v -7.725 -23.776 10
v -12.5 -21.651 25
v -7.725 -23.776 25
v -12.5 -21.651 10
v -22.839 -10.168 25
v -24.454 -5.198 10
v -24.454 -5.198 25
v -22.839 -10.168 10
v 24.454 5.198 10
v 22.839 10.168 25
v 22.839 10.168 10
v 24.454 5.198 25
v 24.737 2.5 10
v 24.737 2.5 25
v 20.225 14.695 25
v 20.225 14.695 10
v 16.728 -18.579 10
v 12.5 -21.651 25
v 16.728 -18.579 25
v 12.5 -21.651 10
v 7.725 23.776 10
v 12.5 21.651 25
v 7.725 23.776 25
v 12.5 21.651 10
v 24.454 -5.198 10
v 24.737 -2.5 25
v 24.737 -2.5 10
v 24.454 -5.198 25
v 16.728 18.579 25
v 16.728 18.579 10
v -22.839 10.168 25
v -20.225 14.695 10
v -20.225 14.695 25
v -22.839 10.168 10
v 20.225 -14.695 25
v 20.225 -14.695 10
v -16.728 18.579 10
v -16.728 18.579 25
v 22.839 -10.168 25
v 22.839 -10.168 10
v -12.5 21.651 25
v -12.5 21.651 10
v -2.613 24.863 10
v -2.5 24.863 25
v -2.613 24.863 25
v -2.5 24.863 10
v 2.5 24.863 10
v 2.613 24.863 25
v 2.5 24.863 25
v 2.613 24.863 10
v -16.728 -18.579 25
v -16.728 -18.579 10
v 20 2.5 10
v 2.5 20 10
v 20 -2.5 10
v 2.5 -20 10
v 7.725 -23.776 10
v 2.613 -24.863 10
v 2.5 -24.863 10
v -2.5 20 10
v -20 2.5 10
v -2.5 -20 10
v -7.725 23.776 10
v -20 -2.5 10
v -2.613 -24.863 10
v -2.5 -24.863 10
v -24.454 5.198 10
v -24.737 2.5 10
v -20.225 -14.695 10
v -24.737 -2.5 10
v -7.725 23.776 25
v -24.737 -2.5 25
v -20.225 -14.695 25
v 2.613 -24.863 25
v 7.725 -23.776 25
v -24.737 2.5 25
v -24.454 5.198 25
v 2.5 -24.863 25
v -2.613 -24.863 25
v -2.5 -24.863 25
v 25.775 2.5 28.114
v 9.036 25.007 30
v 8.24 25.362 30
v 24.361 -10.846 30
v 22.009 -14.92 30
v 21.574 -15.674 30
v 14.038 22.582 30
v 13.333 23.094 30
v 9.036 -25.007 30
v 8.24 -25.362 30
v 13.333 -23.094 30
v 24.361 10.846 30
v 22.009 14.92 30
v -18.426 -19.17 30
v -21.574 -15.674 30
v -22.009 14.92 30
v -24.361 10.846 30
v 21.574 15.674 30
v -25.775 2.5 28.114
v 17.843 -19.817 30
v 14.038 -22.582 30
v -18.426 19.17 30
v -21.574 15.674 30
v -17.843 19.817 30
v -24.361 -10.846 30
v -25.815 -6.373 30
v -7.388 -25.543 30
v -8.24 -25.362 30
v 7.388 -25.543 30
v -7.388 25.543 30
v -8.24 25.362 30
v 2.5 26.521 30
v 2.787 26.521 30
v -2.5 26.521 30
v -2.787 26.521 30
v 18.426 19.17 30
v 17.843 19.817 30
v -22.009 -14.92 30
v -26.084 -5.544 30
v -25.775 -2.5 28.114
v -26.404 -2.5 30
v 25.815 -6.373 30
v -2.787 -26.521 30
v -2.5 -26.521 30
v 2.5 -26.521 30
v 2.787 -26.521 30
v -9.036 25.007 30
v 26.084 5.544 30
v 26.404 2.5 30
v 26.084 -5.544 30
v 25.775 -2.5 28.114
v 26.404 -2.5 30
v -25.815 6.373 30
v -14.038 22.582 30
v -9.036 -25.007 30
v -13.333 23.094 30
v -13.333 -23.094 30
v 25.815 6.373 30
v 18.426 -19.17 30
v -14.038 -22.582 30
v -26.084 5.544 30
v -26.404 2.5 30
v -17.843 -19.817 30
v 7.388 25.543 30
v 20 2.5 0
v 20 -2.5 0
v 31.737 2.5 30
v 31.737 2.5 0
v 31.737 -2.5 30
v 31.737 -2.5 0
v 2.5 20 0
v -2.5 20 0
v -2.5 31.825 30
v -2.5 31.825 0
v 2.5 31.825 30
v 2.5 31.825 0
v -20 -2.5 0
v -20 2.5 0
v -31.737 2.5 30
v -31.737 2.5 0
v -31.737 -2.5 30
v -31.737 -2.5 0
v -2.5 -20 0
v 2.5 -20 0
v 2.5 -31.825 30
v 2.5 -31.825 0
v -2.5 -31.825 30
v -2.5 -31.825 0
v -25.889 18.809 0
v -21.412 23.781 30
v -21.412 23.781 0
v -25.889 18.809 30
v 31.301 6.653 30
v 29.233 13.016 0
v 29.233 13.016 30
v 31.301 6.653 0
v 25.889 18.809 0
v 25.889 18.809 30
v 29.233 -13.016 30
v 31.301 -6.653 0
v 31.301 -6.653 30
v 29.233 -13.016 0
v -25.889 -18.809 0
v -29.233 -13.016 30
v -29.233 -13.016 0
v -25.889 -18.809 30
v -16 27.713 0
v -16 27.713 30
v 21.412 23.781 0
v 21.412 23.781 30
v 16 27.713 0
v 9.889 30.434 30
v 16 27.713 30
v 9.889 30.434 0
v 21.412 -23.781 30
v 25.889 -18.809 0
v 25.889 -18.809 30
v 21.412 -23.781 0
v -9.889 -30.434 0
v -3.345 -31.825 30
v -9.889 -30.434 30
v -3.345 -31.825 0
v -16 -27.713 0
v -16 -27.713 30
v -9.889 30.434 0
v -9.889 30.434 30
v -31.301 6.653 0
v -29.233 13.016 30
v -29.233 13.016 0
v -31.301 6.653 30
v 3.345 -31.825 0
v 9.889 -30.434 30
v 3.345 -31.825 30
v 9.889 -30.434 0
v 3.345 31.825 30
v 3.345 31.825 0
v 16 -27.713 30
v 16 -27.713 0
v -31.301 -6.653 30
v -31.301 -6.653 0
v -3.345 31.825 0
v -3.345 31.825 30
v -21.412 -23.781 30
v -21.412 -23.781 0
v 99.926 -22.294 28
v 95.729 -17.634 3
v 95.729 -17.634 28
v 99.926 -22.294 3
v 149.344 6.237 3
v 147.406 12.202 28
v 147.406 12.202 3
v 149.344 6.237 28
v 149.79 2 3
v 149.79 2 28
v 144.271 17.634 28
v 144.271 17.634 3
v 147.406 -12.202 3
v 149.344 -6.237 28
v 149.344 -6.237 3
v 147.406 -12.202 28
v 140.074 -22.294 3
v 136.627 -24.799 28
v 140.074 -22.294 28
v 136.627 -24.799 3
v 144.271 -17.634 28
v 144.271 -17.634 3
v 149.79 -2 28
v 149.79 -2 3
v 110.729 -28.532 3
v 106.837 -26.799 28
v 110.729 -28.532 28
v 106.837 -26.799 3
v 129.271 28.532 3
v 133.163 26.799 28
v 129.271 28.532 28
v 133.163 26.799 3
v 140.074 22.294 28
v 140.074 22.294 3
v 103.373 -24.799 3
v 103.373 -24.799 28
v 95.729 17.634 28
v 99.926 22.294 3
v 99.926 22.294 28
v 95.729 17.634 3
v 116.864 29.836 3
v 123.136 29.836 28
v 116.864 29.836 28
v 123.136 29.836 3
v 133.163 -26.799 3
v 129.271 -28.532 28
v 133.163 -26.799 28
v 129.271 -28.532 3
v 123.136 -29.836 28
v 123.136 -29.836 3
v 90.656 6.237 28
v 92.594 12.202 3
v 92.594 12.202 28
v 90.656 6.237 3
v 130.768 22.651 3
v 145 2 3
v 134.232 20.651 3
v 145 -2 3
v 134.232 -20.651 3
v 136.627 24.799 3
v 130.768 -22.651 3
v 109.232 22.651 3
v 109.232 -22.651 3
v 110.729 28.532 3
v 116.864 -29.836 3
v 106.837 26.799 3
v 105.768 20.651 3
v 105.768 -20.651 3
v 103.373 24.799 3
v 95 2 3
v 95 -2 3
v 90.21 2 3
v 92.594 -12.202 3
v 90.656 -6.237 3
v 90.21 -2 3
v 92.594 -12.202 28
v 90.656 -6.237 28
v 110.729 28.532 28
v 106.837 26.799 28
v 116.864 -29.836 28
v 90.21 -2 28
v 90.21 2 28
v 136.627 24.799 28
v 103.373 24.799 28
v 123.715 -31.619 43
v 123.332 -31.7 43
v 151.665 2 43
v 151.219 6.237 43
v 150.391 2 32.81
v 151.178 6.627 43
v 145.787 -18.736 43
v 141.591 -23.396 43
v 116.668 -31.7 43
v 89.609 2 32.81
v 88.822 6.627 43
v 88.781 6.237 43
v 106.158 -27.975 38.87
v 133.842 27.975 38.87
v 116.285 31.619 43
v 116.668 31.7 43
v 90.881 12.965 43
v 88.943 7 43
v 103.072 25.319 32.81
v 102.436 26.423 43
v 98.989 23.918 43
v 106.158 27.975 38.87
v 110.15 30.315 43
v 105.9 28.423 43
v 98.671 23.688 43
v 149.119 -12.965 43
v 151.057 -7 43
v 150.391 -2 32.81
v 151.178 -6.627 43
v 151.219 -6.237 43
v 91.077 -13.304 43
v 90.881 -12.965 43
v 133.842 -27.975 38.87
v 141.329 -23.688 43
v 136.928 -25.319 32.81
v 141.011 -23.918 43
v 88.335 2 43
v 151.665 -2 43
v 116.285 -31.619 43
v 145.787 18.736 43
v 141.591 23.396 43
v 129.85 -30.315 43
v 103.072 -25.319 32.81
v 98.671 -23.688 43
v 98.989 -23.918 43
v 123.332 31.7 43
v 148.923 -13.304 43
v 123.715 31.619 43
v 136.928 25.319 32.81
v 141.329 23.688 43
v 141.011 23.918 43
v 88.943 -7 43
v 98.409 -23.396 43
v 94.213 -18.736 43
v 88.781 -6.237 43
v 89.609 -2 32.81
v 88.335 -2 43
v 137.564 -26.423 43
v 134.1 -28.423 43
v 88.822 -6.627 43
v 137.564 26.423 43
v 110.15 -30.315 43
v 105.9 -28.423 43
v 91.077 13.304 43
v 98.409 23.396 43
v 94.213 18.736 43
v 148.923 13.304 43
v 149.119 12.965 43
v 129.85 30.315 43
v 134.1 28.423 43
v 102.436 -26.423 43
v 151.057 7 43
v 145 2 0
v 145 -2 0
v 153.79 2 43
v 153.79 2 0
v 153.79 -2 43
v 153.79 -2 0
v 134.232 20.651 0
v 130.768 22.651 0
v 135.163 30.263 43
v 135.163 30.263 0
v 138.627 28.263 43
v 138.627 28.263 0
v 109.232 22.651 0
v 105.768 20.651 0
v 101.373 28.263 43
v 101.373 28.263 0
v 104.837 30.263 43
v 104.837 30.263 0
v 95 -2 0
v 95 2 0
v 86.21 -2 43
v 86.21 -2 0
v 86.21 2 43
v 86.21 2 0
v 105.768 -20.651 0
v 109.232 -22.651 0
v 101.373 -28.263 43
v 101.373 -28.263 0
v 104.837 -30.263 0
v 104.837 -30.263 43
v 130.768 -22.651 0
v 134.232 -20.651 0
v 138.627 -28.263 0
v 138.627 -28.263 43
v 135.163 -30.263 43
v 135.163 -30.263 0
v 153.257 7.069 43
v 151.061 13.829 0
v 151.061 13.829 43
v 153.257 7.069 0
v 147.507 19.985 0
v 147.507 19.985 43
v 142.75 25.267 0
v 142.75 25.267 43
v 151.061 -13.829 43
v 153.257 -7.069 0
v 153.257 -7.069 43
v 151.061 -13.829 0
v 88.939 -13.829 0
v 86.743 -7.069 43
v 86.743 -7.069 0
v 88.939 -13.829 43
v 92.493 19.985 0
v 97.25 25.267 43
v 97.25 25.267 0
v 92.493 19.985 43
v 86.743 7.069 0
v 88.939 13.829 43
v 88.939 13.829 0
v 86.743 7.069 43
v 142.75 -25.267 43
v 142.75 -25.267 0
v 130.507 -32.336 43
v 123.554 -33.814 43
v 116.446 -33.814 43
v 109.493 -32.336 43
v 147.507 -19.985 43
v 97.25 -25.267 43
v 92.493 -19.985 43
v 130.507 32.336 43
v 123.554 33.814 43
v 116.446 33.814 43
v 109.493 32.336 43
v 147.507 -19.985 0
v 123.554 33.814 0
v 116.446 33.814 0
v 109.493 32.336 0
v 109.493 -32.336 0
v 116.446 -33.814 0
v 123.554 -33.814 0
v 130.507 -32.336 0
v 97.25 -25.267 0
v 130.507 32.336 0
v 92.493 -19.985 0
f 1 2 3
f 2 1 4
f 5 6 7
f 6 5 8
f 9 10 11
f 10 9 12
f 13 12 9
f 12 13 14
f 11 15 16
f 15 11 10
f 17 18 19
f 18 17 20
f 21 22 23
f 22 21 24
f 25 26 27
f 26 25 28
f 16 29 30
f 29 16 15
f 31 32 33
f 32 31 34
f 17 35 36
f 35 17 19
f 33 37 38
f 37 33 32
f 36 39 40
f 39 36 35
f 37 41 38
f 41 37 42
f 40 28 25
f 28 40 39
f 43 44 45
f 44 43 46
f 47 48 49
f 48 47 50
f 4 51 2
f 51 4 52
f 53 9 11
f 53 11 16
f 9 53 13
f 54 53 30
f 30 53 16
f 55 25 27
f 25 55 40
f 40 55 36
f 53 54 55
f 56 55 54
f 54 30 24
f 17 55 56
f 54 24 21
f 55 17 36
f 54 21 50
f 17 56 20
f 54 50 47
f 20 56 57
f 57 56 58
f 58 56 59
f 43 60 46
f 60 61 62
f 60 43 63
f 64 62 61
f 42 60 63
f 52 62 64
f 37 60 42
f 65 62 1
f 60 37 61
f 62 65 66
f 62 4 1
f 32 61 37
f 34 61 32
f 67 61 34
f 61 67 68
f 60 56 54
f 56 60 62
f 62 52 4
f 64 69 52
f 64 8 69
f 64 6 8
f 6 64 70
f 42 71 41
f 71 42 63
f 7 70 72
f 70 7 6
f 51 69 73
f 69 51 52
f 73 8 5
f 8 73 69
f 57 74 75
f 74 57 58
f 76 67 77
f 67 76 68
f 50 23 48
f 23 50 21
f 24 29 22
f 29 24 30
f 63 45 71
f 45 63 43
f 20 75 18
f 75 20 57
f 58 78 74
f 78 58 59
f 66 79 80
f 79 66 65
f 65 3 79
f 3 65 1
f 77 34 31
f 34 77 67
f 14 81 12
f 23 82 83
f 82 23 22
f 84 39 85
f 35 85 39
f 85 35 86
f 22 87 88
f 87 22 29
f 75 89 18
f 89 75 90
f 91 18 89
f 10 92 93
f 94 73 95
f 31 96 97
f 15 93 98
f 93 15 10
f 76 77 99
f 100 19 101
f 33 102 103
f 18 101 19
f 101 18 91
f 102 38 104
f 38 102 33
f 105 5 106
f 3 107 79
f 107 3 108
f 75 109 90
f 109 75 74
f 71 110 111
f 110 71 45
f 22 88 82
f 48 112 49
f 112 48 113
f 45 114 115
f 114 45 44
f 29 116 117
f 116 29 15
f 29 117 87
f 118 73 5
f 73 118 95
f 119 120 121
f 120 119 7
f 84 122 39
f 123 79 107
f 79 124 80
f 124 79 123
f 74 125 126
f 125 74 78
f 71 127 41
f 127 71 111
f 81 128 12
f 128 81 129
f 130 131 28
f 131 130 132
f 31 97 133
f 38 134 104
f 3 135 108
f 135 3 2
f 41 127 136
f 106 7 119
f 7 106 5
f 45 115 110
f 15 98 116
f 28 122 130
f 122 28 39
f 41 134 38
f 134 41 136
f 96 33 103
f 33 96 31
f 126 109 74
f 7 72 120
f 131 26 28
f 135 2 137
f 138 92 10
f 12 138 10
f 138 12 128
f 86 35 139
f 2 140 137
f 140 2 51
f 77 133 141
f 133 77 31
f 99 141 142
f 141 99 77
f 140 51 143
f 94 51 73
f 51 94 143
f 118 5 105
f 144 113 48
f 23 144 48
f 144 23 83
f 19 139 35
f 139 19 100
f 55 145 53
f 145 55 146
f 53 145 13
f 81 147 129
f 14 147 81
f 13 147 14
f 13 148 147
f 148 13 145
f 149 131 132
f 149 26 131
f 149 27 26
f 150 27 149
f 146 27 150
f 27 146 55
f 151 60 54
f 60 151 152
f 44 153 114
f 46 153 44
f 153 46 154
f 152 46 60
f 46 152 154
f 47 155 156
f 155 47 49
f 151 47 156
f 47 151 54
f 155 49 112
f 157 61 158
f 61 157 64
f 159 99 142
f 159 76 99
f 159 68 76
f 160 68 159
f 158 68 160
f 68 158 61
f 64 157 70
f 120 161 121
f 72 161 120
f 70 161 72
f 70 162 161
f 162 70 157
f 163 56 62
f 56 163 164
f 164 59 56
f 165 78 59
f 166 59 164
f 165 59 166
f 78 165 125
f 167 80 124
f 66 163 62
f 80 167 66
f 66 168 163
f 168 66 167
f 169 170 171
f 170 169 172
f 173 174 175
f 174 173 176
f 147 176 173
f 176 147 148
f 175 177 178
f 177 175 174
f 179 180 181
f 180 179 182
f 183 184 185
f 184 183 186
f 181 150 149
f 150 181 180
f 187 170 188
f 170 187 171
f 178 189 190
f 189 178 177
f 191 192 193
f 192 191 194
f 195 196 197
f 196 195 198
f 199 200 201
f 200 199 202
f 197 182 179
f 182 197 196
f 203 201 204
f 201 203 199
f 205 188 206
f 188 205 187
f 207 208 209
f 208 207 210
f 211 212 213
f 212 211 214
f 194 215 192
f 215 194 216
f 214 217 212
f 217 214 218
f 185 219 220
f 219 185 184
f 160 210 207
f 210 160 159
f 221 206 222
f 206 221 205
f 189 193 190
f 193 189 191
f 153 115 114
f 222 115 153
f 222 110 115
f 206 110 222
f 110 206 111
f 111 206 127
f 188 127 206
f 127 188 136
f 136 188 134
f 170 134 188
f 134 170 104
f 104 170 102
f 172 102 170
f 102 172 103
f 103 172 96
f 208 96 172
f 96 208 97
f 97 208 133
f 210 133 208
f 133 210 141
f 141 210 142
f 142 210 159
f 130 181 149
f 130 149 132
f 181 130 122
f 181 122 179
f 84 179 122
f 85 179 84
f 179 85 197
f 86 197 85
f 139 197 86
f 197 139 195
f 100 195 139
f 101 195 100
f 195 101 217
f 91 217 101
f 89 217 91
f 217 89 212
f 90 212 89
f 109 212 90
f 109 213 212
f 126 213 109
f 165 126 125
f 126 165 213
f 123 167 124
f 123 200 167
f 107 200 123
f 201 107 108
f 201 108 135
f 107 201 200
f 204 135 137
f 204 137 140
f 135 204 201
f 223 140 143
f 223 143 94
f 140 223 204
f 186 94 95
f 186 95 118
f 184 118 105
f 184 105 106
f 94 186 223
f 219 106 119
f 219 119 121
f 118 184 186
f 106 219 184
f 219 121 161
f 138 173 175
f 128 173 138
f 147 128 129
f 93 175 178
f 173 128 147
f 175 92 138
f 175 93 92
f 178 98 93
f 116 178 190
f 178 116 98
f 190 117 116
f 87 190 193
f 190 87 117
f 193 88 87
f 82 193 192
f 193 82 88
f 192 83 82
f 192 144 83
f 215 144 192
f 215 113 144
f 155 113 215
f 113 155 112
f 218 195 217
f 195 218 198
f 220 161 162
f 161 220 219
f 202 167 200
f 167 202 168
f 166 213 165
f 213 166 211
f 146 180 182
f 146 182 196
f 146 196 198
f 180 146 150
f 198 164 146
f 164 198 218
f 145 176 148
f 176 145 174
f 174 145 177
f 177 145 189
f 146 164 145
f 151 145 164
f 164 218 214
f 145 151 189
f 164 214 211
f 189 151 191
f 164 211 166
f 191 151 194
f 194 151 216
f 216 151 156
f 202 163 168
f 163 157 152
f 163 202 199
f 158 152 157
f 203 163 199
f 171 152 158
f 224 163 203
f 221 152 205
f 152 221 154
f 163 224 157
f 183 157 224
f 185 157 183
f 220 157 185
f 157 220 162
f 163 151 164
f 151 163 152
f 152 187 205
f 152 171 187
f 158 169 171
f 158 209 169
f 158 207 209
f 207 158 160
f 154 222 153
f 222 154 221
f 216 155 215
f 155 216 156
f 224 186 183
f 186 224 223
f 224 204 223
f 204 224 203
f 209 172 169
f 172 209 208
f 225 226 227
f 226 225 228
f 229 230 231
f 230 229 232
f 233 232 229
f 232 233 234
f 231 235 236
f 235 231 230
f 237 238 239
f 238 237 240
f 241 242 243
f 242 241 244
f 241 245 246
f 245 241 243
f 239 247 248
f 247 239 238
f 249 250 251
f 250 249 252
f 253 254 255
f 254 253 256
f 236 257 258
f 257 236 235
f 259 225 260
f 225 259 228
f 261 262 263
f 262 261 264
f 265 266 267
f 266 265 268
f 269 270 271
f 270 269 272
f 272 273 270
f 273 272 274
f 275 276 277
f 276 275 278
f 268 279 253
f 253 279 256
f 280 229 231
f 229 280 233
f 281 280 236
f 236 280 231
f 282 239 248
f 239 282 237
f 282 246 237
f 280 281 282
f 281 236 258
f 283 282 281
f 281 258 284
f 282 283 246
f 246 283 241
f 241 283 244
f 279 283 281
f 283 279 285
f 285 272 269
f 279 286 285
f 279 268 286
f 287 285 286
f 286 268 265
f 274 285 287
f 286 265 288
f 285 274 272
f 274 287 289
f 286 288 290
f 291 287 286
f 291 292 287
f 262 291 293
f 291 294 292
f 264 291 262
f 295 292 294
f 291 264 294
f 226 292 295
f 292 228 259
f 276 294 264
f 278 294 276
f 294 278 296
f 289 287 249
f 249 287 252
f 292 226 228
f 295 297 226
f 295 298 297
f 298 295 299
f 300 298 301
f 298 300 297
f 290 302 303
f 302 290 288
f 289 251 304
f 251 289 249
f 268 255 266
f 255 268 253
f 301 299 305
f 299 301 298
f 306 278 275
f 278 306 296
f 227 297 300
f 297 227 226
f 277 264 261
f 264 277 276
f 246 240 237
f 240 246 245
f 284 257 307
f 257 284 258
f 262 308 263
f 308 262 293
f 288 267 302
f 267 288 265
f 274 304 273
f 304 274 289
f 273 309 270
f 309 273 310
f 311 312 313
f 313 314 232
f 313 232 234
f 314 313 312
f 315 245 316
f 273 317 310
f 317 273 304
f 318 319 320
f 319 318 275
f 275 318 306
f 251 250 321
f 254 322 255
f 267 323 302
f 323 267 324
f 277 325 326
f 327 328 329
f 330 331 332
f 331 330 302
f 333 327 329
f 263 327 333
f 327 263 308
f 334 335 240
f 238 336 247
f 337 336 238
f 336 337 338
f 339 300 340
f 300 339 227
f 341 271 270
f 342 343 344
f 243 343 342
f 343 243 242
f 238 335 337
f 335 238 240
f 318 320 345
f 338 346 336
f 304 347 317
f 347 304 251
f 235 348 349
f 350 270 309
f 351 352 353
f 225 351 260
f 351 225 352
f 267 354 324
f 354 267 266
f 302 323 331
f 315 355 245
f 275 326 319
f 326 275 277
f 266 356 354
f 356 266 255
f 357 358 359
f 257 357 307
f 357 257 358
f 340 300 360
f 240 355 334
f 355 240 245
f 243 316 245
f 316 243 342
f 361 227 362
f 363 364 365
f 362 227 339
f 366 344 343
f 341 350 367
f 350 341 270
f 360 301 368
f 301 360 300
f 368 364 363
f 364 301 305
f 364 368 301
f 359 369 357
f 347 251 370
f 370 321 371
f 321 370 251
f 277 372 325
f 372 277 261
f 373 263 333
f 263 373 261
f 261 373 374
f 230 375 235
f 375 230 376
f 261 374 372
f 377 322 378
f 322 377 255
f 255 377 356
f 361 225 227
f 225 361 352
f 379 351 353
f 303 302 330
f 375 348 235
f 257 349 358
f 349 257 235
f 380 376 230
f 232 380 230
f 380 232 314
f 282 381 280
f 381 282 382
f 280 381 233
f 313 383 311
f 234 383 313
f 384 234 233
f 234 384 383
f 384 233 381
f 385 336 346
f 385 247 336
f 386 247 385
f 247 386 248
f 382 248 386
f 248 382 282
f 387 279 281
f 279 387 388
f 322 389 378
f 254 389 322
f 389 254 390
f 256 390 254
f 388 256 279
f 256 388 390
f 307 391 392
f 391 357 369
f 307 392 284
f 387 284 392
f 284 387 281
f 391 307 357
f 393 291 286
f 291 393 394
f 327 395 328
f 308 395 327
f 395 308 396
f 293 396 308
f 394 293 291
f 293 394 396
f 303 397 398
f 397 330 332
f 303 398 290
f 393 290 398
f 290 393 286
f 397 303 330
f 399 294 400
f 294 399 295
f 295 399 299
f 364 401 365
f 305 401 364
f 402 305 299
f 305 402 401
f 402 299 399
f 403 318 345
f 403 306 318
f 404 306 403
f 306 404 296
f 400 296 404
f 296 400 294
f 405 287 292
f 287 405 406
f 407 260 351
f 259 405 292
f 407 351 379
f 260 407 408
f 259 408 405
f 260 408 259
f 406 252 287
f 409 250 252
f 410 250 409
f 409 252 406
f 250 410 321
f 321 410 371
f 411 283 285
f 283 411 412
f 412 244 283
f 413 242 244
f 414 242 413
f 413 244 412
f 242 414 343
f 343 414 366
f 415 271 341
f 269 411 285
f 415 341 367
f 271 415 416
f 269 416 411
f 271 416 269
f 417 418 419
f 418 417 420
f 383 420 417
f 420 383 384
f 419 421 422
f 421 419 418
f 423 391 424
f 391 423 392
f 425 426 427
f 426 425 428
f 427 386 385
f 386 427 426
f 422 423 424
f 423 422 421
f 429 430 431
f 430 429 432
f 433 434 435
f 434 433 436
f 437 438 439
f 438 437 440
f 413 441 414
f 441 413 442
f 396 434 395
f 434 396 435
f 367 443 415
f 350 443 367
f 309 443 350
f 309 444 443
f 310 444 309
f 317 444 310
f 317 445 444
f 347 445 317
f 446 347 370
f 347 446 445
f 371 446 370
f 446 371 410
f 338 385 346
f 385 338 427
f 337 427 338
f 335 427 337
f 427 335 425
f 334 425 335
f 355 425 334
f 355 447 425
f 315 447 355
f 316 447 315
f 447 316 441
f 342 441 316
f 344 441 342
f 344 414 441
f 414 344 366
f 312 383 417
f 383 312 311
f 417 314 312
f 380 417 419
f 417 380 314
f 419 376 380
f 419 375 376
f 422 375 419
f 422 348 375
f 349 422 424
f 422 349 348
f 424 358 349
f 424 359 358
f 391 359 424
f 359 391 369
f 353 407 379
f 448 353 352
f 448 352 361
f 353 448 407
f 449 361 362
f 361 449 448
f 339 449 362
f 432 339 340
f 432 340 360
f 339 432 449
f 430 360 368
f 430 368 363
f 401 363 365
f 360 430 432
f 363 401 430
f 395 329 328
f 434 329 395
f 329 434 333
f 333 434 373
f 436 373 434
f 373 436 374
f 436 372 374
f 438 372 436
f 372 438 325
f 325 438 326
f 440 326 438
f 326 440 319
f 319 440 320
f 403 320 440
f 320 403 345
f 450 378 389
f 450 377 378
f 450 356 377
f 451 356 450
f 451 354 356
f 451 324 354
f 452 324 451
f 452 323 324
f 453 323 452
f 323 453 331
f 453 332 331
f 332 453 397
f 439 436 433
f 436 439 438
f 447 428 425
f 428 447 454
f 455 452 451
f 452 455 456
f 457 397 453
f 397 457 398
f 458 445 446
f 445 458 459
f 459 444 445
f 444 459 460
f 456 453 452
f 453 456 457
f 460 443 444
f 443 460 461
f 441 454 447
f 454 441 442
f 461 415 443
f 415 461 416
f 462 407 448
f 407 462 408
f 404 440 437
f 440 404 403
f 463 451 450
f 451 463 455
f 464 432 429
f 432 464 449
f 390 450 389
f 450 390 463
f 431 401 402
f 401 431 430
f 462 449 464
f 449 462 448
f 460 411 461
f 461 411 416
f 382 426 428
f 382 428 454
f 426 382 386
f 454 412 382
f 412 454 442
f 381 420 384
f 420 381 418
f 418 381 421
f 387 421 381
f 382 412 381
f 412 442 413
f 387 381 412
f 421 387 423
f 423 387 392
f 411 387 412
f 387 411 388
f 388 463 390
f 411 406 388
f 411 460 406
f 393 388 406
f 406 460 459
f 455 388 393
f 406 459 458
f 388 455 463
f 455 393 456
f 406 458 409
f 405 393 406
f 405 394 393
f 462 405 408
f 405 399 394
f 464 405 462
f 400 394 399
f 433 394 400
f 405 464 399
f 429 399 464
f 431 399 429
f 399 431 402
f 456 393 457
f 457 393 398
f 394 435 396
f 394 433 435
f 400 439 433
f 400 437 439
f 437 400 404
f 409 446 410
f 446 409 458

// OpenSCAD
// A small, ashtray-shaped clamp for holding fin assemblies into a body while glue sets
module rocket_base_clamp(
    // Parameters of the rocket
    tube_diameter,
    fin_thickness,
    num_fins=4,
    // Basic dimensions
    claw_depth=20,
    base_depth=10,
    lip_width=7,
    // Bevel around the lip to allow easy fitting
    bevel_depth=5,
    bevel_expansion=2,
    // Notches
    notch_depth=5,
    notch_fin_sep=1,
) {
    notch_height = claw_depth + base_depth + 2;
    notch_width = fin_thickness + (notch_fin_sep * 2);

    difference() {
        // Base cylinder
        cylinder(h = base_depth + claw_depth, r = (tube_diameter / 2) + lip_width);

        // Hole
        union () {
            translate([0, 0, base_depth])
                cylinder(h = claw_depth + 1, r = tube_diameter / 2);

            translate([0, 0, base_depth + (claw_depth - bevel_depth)])
                cylinder(
                    h = bevel_depth + 1,
                    r1 = tube_diameter / 2,
                    r2 = (tube_diameter / 2) + bevel_expansion
                );
        };

        // Cutouts
        for (i = [0:num_fins - 1]) {
            rotate([0, 0, (360 / num_fins) * i])
            translate([
                (tube_diameter / 2) - notch_depth,
                -(notch_width / 2),
                -1
            ])
            cube(
                [
                    notch_depth + lip_width,
                    notch_width,
                    notch_height
                ]
            );
        }
    };
};

rocket_base_clamp(50, 3);

translate([120, 0, 0])
rocket_base_clamp(
    60,
    2,
    num_fins=6,
    base_depth=3,
    claw_depth=40,
    lip_width=4,
    bevel_depth=15
);
